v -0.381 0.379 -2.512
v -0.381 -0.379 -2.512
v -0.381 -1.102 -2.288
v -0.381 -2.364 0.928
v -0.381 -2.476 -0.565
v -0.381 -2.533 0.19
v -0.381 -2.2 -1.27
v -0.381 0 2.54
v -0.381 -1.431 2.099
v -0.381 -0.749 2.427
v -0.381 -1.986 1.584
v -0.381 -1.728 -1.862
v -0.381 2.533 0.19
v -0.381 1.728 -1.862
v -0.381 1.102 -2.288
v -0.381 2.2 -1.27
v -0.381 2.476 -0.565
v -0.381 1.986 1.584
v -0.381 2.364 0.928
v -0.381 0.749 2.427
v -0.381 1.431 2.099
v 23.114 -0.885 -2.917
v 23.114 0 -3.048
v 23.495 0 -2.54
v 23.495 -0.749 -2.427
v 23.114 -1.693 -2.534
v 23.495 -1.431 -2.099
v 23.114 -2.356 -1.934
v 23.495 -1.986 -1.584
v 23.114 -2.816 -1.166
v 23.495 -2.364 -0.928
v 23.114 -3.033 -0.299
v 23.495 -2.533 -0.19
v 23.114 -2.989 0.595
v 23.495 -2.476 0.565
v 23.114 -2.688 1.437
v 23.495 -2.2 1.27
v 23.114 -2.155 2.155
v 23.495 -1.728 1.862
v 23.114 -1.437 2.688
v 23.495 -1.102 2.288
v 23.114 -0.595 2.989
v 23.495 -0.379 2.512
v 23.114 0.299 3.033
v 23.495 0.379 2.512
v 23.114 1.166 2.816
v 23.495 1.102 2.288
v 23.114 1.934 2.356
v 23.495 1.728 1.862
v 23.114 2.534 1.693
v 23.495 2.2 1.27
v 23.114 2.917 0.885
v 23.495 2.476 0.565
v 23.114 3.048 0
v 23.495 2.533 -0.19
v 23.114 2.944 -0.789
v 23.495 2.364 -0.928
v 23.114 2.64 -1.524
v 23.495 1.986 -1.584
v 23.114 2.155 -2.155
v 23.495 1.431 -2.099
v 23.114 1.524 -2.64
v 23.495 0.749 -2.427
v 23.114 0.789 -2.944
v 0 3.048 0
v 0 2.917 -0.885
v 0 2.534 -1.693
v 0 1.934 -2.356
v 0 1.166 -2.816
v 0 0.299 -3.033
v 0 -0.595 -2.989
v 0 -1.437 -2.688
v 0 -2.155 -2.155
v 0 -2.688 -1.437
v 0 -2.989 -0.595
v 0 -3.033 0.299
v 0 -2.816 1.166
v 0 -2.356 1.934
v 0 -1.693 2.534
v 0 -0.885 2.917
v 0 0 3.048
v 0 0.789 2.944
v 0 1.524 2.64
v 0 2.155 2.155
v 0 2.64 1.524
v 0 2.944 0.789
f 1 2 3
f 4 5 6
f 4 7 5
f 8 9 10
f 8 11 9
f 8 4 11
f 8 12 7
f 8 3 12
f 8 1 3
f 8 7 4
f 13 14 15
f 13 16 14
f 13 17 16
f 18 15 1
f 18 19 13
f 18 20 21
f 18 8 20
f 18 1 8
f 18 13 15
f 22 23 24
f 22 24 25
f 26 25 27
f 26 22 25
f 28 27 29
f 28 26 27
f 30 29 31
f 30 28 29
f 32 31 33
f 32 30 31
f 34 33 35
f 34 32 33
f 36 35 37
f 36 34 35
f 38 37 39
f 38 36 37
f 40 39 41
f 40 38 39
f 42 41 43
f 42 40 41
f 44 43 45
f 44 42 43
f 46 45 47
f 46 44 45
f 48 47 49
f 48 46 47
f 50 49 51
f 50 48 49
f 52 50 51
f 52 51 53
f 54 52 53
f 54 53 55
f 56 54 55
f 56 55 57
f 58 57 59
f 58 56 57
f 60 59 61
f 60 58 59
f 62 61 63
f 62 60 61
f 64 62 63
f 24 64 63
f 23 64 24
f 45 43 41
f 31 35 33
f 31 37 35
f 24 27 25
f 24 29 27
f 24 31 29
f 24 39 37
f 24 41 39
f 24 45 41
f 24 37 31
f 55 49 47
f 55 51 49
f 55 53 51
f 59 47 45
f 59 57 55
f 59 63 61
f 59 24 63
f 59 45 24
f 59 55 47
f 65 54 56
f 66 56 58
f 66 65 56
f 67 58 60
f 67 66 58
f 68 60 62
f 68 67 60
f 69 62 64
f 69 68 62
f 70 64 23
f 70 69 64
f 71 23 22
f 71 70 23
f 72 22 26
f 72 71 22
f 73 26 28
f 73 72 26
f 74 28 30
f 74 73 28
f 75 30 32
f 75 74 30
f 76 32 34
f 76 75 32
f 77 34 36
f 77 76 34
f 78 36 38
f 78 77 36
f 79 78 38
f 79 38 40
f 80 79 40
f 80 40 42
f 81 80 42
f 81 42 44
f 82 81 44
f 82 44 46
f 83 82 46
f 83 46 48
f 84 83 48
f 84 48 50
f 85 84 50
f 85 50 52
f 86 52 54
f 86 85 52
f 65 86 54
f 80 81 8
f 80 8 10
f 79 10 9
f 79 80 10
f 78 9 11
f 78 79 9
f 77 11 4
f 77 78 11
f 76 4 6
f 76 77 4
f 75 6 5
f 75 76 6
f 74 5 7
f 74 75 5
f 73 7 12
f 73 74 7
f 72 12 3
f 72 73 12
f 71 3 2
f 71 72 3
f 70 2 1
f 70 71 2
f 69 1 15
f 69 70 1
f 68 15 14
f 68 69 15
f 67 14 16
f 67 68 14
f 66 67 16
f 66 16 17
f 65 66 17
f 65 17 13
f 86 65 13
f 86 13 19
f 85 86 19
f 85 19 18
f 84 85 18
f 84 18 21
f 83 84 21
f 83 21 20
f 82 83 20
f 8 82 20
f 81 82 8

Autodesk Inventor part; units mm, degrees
ref_plane "YZ Plane" through (0, 0, 0) normal (1, 0, 0) x (0, 1, 0)
sketch "Sketch1" plane through (0, 0, 0) normal (1, 0, 0) x (0, 1, 0)
  circle A0 centre (0, 0) radius 3.048
  dimension "d0" = 6.096
extrude "Extrusion1" add sketch "Sketch1" along normal blind 23.114
ref_plane "Work Plane1" through (23.495, 0, 0) normal (1, 0, 0) x (0, 0, -1)
sketch "Sketch2" plane through (23.495, 0, 0) normal (1, 0, 0) x (0, 0, -1)
  circle A0 centre (0, 0) radius 2.54
  dimension "d4" = 5.08
loft "Loft1" add profiles "Sketch2" section 2 edges at (23.114, -3.048, 0)
ref_plane "Work Plane2" through (-0.381, 0, 0) normal (-1, 0, 0) x (0, 0, 1)
sketch "Sketch3" plane through (-0.381, 0, 0) normal (-1, 0, 0) x (0, 0, 1)
  circle A0 centre (0, 0) radius 2.54
  dimension "d10" = 5.08
loft "Loft2" add profiles "Sketch3" section 2 edges at (0, -3.048, 0)
properties part number "shaft 6x24-1"
